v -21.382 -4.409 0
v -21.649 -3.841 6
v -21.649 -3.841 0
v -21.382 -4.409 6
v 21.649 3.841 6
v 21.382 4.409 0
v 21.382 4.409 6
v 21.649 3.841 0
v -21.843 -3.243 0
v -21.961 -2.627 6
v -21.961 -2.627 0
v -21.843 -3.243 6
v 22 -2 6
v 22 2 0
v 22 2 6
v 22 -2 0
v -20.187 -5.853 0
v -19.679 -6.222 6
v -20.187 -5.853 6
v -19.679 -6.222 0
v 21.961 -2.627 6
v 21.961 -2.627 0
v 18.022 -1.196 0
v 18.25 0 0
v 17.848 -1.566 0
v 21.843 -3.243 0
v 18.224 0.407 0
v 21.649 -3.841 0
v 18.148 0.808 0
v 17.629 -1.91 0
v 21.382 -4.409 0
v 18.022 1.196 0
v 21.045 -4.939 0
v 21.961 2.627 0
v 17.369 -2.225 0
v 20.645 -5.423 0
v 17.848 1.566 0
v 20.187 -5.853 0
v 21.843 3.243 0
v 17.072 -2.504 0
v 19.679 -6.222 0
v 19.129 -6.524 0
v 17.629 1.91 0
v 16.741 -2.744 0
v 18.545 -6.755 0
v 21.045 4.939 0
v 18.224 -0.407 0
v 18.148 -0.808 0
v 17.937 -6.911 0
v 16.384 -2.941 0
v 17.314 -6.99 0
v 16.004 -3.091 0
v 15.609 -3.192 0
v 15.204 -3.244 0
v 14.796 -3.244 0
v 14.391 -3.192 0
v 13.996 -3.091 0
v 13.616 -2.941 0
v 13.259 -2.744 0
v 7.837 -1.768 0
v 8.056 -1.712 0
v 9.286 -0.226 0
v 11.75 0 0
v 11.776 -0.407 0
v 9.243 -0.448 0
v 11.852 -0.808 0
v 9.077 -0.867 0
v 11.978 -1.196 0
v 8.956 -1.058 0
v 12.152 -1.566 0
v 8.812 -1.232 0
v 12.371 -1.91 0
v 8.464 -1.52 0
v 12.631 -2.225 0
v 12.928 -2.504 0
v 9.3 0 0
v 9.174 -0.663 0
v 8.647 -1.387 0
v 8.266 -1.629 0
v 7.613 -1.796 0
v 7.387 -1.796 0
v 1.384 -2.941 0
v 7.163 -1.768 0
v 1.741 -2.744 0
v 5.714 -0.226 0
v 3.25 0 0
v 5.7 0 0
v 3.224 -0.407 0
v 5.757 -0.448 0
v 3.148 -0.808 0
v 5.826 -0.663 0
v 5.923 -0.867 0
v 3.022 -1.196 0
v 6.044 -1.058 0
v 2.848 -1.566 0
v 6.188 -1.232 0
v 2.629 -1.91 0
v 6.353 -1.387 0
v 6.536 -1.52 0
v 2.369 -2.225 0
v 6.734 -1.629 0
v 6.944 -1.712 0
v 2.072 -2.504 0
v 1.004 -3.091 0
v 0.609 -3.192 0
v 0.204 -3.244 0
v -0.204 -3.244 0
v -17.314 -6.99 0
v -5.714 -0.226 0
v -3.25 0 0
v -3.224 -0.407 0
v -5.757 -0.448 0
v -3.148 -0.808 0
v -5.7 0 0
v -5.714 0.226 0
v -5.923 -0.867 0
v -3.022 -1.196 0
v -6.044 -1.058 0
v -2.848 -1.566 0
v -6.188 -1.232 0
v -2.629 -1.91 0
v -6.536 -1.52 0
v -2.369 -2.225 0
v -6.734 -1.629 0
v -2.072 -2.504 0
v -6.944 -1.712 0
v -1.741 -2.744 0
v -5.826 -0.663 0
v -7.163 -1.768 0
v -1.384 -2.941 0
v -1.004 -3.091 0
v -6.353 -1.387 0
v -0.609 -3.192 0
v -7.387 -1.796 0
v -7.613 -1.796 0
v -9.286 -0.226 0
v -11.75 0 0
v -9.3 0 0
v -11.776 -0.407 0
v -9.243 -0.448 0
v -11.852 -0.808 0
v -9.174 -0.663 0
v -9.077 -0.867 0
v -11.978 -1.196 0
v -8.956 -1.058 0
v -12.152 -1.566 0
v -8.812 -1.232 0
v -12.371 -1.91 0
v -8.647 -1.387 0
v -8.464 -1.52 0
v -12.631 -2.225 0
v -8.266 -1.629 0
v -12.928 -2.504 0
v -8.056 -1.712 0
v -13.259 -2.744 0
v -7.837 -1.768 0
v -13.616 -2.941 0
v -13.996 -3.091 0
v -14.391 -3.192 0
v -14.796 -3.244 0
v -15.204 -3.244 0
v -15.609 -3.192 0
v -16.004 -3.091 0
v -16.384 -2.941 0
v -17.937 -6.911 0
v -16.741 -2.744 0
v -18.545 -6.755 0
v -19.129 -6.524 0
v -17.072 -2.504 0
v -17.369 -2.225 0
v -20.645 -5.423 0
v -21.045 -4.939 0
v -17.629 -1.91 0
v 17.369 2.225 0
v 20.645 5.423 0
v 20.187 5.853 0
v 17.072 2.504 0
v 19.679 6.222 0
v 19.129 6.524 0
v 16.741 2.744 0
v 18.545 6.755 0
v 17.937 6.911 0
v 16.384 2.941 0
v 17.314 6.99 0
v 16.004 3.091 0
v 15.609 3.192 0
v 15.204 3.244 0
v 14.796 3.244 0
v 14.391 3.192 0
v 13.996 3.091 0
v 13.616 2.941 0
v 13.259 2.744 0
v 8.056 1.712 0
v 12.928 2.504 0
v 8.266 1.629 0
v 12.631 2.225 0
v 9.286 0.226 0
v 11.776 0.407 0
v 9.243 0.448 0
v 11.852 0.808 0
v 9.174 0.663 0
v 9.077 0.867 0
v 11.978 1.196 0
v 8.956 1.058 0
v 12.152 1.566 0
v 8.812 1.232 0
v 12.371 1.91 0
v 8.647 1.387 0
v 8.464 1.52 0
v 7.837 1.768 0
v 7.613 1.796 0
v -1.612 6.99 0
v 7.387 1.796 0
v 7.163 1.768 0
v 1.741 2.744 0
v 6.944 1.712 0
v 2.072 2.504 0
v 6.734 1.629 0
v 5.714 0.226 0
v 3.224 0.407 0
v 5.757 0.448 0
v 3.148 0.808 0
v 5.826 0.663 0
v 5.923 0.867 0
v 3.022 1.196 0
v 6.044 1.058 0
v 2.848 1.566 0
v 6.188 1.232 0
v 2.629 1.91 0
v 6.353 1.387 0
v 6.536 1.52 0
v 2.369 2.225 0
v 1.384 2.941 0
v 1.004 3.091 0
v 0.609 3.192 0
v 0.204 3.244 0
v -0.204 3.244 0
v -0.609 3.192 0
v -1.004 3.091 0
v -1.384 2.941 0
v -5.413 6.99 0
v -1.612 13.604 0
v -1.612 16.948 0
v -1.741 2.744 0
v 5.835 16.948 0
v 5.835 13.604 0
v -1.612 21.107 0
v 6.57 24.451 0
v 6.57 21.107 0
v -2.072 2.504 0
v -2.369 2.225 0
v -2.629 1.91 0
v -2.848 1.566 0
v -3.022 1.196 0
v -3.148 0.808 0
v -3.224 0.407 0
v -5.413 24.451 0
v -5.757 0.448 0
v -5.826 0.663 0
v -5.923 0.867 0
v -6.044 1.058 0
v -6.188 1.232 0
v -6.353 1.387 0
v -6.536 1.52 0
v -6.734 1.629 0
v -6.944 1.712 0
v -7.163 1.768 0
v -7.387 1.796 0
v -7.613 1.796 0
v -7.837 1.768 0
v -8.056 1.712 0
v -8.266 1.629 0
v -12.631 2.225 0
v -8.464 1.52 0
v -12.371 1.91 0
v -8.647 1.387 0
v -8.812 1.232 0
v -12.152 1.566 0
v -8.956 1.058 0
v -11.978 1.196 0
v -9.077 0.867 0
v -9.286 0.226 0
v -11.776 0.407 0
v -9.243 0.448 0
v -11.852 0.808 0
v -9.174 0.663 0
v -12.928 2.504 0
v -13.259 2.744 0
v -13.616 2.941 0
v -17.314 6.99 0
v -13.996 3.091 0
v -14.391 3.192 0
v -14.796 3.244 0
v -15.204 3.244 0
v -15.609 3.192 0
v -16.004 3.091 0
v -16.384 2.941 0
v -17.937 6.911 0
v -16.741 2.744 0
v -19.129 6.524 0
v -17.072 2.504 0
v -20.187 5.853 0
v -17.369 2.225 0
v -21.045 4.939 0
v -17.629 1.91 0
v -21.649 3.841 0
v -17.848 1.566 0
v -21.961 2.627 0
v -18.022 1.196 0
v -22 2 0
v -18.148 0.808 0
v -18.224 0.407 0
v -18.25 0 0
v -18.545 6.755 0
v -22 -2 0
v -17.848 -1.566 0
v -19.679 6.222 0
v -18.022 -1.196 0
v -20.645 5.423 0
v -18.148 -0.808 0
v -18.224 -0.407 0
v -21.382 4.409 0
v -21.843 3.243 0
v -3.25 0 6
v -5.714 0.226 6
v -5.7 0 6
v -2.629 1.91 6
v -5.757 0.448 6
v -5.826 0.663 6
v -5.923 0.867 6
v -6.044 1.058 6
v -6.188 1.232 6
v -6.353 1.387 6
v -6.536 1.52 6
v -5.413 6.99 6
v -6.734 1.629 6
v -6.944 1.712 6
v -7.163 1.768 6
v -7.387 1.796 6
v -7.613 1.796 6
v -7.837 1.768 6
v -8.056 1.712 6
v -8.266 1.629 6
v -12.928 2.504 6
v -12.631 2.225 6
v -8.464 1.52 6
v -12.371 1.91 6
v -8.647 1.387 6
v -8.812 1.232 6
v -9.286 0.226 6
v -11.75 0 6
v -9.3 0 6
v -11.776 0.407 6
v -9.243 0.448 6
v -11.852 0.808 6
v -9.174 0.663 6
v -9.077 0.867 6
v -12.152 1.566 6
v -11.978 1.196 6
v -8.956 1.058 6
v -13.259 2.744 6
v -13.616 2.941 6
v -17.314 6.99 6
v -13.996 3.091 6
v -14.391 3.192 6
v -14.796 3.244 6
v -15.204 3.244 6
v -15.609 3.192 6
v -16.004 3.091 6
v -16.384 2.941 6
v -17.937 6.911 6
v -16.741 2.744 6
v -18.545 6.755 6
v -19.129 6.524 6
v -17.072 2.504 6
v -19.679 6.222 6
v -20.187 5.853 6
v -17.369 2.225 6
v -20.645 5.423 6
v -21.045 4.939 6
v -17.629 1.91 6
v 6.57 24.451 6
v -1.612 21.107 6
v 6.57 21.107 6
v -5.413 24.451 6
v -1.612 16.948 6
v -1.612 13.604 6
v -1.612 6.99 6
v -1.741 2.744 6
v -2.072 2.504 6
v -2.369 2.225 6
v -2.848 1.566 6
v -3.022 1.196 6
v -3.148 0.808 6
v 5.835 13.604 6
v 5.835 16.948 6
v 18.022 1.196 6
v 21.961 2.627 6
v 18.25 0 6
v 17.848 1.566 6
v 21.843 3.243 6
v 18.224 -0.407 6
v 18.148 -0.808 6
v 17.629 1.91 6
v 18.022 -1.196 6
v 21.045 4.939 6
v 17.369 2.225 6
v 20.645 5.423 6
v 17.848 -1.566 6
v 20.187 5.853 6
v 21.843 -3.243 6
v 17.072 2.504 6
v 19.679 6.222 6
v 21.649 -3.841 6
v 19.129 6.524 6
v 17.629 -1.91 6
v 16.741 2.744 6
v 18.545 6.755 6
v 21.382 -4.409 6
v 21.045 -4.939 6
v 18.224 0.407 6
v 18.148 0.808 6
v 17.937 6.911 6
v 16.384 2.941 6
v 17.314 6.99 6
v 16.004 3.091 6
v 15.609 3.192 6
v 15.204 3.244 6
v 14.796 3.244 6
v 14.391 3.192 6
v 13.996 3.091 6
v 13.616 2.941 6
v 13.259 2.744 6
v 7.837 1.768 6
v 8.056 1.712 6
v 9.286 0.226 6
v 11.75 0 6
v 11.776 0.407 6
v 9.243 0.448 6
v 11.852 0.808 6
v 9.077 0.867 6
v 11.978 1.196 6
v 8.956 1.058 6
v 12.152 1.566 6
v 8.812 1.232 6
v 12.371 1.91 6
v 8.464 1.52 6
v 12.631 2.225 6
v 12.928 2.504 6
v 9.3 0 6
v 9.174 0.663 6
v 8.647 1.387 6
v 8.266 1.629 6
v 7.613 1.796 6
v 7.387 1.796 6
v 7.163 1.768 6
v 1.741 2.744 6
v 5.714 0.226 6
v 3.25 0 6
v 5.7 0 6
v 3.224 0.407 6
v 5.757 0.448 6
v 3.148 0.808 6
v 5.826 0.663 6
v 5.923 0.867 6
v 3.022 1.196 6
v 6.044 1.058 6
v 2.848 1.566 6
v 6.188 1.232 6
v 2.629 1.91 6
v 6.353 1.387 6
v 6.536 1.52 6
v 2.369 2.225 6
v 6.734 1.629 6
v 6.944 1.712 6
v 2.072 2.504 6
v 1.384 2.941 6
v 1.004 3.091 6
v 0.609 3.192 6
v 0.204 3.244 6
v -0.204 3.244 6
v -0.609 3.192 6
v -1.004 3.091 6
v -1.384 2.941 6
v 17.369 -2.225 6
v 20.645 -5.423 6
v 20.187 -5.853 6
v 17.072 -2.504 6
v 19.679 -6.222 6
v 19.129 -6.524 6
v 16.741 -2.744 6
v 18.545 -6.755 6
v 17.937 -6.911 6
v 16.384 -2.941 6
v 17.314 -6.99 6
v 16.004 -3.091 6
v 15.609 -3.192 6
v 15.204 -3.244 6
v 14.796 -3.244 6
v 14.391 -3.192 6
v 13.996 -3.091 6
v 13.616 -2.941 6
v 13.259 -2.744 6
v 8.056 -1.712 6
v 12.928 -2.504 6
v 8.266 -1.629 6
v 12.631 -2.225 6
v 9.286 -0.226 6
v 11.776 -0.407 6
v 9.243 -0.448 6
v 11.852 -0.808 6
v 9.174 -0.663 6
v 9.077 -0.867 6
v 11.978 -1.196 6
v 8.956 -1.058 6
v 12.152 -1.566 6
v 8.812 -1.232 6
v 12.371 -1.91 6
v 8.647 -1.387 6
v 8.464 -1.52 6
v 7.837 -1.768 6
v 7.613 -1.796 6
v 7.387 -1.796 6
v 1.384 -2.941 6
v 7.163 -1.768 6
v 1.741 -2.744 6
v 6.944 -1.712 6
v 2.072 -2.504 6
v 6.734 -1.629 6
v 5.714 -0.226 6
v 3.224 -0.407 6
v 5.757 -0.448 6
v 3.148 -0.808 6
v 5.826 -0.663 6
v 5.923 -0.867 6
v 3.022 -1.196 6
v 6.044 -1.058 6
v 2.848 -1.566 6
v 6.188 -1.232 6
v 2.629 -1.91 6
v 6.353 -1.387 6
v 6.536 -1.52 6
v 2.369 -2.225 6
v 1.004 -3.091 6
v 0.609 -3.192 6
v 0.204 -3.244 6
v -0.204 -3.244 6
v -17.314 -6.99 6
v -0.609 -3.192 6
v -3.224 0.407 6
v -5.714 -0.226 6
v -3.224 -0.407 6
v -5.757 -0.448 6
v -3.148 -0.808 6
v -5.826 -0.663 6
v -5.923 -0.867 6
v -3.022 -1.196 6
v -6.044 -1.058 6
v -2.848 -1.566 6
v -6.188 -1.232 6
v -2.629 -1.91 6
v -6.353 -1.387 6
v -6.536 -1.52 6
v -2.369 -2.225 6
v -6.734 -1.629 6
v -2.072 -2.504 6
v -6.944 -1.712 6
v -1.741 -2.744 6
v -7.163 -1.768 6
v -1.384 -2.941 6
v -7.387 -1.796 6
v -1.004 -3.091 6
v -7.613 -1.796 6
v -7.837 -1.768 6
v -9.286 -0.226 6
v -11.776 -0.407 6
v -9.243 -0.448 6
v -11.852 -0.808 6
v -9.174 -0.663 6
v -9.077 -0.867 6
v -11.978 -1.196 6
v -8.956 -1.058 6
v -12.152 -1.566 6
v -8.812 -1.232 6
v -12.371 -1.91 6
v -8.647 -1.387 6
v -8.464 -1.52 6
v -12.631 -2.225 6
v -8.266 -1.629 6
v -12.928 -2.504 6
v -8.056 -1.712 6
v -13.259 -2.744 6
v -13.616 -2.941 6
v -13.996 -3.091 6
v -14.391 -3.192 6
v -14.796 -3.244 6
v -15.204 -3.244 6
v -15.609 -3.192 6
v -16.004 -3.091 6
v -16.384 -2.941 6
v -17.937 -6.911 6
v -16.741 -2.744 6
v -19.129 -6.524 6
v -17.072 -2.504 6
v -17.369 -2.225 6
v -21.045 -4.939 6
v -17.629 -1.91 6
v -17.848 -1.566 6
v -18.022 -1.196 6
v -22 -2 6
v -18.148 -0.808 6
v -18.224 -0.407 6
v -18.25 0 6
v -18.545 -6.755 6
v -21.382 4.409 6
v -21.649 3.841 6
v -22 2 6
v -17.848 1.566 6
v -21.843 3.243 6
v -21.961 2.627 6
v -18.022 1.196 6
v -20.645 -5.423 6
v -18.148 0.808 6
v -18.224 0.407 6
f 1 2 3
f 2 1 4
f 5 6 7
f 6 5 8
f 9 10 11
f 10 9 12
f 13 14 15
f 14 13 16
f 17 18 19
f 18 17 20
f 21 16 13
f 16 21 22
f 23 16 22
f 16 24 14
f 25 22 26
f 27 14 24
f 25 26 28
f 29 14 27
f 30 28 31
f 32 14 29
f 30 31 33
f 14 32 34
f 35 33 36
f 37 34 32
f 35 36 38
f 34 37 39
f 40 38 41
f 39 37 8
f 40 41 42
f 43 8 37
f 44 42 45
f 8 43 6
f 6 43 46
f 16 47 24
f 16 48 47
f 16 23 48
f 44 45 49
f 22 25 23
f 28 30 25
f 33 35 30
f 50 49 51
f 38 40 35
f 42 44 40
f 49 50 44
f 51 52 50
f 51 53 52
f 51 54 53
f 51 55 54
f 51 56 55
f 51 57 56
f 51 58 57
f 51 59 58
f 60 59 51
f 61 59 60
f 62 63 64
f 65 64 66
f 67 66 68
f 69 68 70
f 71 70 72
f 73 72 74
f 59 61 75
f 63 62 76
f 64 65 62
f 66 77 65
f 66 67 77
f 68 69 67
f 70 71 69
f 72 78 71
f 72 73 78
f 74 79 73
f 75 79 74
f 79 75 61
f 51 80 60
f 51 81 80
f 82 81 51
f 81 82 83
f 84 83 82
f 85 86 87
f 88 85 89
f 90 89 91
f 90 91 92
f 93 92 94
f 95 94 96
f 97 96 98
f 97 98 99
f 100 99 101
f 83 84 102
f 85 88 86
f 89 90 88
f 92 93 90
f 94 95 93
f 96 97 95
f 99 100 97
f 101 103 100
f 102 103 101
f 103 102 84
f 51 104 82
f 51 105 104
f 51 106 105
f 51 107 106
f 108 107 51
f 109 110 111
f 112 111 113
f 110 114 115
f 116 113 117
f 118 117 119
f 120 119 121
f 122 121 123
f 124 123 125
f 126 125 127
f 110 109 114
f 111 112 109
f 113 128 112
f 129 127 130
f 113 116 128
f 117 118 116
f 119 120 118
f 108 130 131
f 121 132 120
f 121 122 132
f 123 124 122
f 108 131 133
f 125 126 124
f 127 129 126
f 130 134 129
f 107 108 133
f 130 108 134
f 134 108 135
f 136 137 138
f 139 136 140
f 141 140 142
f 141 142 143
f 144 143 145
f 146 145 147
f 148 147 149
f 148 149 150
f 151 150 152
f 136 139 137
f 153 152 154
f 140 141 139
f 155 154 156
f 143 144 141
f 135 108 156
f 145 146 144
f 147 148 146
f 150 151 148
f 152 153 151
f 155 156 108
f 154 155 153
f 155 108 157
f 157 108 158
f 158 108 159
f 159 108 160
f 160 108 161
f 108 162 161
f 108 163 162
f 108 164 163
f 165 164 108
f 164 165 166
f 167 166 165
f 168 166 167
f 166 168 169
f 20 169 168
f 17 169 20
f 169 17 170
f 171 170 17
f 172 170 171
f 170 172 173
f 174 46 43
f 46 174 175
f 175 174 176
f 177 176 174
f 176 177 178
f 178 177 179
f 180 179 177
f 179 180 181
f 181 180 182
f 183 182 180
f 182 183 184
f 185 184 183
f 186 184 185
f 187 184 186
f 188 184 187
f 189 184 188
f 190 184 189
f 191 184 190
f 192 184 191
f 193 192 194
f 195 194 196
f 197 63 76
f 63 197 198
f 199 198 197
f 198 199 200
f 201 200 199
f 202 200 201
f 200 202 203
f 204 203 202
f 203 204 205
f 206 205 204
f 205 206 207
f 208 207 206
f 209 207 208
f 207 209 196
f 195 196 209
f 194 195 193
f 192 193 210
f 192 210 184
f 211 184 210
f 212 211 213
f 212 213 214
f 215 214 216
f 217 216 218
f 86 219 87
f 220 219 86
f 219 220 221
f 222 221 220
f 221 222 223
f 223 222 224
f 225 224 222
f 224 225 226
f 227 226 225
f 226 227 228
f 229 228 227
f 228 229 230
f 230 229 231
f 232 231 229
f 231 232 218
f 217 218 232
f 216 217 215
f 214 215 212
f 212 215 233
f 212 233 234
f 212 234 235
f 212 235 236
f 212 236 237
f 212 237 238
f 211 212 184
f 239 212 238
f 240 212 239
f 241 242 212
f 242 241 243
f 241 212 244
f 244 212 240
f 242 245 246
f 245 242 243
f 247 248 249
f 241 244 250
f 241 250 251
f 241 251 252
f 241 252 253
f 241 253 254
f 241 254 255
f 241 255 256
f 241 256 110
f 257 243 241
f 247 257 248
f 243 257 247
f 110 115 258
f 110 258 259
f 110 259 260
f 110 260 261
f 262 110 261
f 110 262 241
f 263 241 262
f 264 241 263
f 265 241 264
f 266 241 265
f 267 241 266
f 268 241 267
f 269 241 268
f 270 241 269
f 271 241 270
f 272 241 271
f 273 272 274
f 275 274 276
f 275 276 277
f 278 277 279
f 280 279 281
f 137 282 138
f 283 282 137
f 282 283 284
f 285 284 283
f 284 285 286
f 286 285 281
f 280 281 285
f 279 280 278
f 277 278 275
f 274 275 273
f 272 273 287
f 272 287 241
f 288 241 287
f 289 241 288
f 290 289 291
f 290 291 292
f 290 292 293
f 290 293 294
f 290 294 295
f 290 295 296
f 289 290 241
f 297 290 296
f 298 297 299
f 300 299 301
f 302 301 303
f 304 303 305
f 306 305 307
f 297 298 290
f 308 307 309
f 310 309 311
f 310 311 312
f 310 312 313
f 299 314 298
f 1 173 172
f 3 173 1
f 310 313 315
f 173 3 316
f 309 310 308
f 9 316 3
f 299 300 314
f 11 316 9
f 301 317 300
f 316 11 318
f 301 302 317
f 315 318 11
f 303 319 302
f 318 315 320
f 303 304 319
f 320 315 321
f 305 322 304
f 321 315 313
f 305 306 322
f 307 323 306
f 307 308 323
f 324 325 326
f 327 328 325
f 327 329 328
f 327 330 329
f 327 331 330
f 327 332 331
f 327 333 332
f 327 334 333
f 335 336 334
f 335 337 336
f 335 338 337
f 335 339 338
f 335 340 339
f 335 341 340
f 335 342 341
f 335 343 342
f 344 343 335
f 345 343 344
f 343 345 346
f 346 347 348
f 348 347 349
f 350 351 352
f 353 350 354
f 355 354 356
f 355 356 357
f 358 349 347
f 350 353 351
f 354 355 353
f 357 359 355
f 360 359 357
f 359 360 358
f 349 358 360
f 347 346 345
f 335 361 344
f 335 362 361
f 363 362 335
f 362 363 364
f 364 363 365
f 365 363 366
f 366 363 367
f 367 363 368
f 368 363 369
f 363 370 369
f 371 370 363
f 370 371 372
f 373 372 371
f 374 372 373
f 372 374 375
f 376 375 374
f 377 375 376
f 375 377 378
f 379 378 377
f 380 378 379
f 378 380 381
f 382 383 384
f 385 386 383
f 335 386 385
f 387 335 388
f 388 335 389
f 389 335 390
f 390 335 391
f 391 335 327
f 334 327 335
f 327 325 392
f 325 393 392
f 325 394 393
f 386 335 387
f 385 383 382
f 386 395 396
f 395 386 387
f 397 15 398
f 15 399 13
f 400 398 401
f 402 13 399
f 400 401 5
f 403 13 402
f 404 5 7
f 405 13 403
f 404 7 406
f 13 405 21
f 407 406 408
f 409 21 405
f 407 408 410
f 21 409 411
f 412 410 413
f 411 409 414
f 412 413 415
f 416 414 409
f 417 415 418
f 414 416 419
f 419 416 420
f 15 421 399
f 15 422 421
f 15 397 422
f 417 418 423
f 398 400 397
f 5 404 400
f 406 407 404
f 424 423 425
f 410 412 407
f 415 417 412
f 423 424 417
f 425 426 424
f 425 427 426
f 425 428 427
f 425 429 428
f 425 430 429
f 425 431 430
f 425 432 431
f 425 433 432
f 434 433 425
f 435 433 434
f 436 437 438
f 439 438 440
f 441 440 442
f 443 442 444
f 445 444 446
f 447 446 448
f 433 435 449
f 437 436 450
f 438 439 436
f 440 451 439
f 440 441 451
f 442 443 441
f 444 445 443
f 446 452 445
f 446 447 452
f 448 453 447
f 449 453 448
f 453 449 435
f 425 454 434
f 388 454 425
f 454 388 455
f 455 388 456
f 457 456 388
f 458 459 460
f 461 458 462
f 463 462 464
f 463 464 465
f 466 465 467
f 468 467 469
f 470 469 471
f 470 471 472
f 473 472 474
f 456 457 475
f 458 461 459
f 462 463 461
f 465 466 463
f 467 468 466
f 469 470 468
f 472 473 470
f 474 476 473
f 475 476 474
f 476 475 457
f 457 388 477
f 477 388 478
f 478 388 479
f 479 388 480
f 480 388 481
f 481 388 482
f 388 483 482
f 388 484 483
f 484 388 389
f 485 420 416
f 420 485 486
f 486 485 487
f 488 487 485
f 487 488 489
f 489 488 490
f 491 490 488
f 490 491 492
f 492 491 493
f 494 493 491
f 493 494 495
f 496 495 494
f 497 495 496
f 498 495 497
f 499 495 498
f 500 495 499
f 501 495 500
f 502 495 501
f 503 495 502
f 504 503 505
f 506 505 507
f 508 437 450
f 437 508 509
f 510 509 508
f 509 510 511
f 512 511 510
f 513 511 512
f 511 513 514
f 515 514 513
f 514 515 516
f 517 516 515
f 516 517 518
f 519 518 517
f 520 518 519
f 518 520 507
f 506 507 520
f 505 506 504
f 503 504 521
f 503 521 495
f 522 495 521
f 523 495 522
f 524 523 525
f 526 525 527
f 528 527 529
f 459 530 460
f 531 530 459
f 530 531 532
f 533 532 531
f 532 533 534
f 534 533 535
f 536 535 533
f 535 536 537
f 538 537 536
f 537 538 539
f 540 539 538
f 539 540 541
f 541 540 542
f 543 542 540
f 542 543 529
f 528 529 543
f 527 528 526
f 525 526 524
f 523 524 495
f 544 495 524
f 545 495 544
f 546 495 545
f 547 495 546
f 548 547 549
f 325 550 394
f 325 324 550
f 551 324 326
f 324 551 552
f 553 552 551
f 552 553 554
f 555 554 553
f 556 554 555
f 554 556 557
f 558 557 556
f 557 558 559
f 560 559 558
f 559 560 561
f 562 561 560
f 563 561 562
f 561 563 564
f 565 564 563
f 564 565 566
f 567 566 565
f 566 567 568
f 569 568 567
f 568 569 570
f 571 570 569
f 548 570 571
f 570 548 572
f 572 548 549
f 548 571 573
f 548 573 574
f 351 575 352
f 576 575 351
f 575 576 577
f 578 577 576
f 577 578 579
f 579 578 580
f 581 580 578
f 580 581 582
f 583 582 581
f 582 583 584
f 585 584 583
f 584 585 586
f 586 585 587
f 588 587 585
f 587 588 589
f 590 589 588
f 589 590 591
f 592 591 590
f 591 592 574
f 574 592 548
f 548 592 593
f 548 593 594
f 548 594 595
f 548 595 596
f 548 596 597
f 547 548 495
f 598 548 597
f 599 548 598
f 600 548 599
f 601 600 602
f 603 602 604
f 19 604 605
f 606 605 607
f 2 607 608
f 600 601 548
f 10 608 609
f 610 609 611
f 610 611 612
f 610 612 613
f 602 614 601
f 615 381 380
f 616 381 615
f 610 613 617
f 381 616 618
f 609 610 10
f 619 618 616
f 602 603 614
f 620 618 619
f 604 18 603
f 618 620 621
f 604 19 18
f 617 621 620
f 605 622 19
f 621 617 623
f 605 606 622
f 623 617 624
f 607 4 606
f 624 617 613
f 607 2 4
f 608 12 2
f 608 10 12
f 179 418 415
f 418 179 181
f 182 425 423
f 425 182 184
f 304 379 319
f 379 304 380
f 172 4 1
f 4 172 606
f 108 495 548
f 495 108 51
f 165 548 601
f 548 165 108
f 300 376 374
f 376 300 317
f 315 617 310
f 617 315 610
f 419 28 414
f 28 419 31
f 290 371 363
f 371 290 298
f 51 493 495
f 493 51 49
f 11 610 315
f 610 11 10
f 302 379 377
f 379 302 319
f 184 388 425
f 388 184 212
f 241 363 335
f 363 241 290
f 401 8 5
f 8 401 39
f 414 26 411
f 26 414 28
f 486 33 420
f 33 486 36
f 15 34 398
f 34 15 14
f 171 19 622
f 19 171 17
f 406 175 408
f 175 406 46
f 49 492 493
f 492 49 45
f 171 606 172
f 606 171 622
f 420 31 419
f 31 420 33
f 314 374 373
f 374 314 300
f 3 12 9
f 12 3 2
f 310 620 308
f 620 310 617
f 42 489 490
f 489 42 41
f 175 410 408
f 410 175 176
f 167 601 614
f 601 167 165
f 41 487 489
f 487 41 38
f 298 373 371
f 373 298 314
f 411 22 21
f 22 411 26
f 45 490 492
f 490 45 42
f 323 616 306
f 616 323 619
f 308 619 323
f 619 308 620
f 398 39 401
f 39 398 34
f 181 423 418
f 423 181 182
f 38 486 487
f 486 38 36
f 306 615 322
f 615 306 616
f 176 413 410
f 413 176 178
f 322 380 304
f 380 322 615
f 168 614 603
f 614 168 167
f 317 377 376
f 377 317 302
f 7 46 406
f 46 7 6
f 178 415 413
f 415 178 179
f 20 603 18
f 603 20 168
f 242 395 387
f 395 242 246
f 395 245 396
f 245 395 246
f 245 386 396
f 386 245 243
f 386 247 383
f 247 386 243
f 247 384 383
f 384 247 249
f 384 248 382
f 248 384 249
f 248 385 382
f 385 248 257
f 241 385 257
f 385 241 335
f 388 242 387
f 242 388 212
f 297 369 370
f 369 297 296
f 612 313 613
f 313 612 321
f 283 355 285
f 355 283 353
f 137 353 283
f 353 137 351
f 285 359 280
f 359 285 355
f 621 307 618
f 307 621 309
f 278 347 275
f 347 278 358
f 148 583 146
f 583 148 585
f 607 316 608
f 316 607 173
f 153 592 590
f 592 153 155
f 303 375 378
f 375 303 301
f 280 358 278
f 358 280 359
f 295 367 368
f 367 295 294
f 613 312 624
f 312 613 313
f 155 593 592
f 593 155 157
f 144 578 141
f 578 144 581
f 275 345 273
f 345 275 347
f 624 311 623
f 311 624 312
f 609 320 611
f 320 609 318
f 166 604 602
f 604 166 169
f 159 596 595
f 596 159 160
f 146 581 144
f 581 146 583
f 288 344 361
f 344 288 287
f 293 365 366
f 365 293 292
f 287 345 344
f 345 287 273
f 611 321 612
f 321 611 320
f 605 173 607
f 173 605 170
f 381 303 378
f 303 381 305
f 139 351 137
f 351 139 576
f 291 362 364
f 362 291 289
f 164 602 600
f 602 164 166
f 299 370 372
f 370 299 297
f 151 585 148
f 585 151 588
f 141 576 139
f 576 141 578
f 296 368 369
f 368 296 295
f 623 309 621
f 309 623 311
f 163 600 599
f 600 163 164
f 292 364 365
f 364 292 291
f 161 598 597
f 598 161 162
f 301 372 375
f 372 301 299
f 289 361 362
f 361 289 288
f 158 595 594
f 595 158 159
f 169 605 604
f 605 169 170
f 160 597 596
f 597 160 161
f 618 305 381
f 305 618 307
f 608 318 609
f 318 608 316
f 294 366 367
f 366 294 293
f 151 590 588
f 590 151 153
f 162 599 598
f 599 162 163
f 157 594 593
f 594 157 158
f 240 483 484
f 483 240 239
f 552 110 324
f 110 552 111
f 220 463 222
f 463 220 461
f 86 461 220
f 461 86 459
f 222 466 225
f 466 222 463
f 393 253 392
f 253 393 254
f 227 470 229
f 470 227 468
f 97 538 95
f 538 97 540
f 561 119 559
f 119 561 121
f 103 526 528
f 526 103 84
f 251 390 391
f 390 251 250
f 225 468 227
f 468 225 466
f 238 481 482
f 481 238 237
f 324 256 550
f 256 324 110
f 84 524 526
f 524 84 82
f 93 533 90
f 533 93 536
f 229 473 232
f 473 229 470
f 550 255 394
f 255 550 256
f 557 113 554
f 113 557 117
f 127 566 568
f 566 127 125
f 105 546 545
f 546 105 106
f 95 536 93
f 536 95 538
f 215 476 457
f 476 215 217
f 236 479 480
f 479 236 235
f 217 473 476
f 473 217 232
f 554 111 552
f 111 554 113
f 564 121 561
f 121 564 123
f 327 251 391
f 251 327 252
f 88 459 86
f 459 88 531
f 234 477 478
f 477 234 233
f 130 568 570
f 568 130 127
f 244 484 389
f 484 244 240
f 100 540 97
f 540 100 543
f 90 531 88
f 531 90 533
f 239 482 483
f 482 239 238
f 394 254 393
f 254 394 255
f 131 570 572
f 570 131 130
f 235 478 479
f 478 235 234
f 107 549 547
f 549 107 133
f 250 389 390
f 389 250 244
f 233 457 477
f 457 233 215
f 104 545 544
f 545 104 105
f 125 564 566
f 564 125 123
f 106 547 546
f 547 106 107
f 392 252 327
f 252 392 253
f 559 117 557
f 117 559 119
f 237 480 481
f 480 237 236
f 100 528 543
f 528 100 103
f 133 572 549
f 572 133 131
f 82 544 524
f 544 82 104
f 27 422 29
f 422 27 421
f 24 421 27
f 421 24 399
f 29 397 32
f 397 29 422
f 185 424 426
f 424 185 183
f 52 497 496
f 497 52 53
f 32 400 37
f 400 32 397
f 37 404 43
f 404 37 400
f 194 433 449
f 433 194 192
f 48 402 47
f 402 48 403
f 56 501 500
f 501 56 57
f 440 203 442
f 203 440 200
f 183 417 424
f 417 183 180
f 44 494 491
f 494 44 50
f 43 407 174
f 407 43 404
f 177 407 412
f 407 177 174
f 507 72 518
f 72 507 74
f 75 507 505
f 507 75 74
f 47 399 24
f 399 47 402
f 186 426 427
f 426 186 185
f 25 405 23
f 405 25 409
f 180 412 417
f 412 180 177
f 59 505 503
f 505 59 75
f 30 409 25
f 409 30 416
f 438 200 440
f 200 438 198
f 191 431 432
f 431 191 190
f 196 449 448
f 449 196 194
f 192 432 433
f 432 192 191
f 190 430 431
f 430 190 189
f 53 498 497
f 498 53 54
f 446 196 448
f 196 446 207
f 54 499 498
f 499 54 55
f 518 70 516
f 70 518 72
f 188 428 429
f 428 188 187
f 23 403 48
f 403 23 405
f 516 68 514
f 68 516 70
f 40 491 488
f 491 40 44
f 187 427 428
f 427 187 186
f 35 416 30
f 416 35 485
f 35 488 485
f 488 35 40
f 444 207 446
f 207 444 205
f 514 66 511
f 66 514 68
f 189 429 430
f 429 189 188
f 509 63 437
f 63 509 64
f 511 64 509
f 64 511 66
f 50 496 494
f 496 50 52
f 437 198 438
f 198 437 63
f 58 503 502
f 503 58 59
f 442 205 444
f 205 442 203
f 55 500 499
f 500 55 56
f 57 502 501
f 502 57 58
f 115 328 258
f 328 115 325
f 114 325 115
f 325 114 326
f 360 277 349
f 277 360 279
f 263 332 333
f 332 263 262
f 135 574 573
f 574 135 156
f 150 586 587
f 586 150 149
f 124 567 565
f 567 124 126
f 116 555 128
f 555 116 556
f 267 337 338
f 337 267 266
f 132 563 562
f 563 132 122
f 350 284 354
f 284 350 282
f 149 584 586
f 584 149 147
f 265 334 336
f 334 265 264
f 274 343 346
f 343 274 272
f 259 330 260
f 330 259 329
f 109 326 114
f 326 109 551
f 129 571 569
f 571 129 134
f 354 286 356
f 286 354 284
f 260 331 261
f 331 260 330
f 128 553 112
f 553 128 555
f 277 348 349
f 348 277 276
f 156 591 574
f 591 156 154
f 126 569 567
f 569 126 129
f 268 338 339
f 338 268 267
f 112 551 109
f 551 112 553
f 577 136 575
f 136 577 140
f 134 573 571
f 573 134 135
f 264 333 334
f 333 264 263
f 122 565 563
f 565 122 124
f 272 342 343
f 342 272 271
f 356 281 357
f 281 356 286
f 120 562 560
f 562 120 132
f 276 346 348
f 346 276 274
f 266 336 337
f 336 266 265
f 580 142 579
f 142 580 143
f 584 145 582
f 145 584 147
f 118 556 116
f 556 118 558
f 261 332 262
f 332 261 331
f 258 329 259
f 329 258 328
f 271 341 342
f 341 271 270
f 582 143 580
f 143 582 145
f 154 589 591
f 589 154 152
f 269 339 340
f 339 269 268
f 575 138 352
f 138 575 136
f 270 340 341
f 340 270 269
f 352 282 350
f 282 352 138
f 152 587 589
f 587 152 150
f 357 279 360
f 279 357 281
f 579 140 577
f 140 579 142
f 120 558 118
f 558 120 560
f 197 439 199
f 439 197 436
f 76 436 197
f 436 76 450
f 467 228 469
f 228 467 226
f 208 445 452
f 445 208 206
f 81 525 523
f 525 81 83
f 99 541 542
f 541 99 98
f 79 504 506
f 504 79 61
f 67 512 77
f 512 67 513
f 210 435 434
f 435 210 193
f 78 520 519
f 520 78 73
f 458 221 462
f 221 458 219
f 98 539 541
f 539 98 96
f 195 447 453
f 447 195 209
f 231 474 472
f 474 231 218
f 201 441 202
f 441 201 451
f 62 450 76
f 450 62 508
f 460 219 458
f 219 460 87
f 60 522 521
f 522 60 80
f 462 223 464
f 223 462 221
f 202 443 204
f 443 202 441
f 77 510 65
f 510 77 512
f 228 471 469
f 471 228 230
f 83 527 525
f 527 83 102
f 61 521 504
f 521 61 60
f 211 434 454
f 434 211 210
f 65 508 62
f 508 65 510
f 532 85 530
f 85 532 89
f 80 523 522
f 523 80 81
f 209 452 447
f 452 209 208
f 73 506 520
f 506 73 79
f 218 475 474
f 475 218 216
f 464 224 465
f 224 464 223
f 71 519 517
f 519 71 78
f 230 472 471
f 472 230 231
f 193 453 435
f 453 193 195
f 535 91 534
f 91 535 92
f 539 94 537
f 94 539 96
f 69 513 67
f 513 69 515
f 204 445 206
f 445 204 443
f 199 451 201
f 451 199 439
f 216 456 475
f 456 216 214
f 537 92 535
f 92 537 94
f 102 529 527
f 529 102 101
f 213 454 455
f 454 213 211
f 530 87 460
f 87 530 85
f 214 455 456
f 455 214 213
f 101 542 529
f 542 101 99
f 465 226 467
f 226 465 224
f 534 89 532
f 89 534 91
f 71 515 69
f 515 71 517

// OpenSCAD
$fn = 50;


difference() {
	union() {
		hull() {
			translate(v = [-17.0000000000, 2.0000000000, 0]) {
				cylinder(h = 6, r = 5);
			}
			translate(v = [17.0000000000, 2.0000000000, 0]) {
				cylinder(h = 6, r = 5);
			}
			translate(v = [-17.0000000000, -2.0000000000, 0]) {
				cylinder(h = 6, r = 5);
			}
			translate(v = [17.0000000000, -2.0000000000, 0]) {
				cylinder(h = 6, r = 5);
			}
		}
		translate(v = [0, 24, 0]) {
			linear_extrude(height = 6) {
				text(font = "DejaVu Sans Mono:style=Bold", halign = "center", size = 19.0000000000, text = "F", valign = "top");
			}
		}
	}
	union() {
		translate(v = [-15.0000000000, 0.0000000000, 0]) {
			translate(v = [0, 0, -100]) {
				cylinder(h = 200, r = 3.2500000000);
			}
		}
		translate(v = [0, 0, -100]) {
			cylinder(h = 200, r = 3.2500000000);
		}
		translate(v = [15.0000000000, 0.0000000000, 0]) {
			translate(v = [0, 0, -100]) {
				cylinder(h = 200, r = 3.2500000000);
			}
		}
		translate(v = [-15.0000000000, 0.0000000000, 0]) {
			translate(v = [0, 0, -100]) {
				cylinder(h = 200, r = 1.8000000000);
			}
		}
		translate(v = [-7.5000000000, 0.0000000000, 0]) {
			translate(v = [0, 0, -100]) {
				cylinder(h = 200, r = 1.8000000000);
			}
		}
		translate(v = [0, 0, -100]) {
			cylinder(h = 200, r = 1.8000000000);
		}
		translate(v = [7.5000000000, 0.0000000000, 0]) {
			translate(v = [0, 0, -100]) {
				cylinder(h = 200, r = 1.8000000000);
			}
		}
		translate(v = [15.0000000000, 0.0000000000, 0]) {
			translate(v = [0, 0, -100]) {
				cylinder(h = 200, r = 1.8000000000);
			}
		}
	}
}
